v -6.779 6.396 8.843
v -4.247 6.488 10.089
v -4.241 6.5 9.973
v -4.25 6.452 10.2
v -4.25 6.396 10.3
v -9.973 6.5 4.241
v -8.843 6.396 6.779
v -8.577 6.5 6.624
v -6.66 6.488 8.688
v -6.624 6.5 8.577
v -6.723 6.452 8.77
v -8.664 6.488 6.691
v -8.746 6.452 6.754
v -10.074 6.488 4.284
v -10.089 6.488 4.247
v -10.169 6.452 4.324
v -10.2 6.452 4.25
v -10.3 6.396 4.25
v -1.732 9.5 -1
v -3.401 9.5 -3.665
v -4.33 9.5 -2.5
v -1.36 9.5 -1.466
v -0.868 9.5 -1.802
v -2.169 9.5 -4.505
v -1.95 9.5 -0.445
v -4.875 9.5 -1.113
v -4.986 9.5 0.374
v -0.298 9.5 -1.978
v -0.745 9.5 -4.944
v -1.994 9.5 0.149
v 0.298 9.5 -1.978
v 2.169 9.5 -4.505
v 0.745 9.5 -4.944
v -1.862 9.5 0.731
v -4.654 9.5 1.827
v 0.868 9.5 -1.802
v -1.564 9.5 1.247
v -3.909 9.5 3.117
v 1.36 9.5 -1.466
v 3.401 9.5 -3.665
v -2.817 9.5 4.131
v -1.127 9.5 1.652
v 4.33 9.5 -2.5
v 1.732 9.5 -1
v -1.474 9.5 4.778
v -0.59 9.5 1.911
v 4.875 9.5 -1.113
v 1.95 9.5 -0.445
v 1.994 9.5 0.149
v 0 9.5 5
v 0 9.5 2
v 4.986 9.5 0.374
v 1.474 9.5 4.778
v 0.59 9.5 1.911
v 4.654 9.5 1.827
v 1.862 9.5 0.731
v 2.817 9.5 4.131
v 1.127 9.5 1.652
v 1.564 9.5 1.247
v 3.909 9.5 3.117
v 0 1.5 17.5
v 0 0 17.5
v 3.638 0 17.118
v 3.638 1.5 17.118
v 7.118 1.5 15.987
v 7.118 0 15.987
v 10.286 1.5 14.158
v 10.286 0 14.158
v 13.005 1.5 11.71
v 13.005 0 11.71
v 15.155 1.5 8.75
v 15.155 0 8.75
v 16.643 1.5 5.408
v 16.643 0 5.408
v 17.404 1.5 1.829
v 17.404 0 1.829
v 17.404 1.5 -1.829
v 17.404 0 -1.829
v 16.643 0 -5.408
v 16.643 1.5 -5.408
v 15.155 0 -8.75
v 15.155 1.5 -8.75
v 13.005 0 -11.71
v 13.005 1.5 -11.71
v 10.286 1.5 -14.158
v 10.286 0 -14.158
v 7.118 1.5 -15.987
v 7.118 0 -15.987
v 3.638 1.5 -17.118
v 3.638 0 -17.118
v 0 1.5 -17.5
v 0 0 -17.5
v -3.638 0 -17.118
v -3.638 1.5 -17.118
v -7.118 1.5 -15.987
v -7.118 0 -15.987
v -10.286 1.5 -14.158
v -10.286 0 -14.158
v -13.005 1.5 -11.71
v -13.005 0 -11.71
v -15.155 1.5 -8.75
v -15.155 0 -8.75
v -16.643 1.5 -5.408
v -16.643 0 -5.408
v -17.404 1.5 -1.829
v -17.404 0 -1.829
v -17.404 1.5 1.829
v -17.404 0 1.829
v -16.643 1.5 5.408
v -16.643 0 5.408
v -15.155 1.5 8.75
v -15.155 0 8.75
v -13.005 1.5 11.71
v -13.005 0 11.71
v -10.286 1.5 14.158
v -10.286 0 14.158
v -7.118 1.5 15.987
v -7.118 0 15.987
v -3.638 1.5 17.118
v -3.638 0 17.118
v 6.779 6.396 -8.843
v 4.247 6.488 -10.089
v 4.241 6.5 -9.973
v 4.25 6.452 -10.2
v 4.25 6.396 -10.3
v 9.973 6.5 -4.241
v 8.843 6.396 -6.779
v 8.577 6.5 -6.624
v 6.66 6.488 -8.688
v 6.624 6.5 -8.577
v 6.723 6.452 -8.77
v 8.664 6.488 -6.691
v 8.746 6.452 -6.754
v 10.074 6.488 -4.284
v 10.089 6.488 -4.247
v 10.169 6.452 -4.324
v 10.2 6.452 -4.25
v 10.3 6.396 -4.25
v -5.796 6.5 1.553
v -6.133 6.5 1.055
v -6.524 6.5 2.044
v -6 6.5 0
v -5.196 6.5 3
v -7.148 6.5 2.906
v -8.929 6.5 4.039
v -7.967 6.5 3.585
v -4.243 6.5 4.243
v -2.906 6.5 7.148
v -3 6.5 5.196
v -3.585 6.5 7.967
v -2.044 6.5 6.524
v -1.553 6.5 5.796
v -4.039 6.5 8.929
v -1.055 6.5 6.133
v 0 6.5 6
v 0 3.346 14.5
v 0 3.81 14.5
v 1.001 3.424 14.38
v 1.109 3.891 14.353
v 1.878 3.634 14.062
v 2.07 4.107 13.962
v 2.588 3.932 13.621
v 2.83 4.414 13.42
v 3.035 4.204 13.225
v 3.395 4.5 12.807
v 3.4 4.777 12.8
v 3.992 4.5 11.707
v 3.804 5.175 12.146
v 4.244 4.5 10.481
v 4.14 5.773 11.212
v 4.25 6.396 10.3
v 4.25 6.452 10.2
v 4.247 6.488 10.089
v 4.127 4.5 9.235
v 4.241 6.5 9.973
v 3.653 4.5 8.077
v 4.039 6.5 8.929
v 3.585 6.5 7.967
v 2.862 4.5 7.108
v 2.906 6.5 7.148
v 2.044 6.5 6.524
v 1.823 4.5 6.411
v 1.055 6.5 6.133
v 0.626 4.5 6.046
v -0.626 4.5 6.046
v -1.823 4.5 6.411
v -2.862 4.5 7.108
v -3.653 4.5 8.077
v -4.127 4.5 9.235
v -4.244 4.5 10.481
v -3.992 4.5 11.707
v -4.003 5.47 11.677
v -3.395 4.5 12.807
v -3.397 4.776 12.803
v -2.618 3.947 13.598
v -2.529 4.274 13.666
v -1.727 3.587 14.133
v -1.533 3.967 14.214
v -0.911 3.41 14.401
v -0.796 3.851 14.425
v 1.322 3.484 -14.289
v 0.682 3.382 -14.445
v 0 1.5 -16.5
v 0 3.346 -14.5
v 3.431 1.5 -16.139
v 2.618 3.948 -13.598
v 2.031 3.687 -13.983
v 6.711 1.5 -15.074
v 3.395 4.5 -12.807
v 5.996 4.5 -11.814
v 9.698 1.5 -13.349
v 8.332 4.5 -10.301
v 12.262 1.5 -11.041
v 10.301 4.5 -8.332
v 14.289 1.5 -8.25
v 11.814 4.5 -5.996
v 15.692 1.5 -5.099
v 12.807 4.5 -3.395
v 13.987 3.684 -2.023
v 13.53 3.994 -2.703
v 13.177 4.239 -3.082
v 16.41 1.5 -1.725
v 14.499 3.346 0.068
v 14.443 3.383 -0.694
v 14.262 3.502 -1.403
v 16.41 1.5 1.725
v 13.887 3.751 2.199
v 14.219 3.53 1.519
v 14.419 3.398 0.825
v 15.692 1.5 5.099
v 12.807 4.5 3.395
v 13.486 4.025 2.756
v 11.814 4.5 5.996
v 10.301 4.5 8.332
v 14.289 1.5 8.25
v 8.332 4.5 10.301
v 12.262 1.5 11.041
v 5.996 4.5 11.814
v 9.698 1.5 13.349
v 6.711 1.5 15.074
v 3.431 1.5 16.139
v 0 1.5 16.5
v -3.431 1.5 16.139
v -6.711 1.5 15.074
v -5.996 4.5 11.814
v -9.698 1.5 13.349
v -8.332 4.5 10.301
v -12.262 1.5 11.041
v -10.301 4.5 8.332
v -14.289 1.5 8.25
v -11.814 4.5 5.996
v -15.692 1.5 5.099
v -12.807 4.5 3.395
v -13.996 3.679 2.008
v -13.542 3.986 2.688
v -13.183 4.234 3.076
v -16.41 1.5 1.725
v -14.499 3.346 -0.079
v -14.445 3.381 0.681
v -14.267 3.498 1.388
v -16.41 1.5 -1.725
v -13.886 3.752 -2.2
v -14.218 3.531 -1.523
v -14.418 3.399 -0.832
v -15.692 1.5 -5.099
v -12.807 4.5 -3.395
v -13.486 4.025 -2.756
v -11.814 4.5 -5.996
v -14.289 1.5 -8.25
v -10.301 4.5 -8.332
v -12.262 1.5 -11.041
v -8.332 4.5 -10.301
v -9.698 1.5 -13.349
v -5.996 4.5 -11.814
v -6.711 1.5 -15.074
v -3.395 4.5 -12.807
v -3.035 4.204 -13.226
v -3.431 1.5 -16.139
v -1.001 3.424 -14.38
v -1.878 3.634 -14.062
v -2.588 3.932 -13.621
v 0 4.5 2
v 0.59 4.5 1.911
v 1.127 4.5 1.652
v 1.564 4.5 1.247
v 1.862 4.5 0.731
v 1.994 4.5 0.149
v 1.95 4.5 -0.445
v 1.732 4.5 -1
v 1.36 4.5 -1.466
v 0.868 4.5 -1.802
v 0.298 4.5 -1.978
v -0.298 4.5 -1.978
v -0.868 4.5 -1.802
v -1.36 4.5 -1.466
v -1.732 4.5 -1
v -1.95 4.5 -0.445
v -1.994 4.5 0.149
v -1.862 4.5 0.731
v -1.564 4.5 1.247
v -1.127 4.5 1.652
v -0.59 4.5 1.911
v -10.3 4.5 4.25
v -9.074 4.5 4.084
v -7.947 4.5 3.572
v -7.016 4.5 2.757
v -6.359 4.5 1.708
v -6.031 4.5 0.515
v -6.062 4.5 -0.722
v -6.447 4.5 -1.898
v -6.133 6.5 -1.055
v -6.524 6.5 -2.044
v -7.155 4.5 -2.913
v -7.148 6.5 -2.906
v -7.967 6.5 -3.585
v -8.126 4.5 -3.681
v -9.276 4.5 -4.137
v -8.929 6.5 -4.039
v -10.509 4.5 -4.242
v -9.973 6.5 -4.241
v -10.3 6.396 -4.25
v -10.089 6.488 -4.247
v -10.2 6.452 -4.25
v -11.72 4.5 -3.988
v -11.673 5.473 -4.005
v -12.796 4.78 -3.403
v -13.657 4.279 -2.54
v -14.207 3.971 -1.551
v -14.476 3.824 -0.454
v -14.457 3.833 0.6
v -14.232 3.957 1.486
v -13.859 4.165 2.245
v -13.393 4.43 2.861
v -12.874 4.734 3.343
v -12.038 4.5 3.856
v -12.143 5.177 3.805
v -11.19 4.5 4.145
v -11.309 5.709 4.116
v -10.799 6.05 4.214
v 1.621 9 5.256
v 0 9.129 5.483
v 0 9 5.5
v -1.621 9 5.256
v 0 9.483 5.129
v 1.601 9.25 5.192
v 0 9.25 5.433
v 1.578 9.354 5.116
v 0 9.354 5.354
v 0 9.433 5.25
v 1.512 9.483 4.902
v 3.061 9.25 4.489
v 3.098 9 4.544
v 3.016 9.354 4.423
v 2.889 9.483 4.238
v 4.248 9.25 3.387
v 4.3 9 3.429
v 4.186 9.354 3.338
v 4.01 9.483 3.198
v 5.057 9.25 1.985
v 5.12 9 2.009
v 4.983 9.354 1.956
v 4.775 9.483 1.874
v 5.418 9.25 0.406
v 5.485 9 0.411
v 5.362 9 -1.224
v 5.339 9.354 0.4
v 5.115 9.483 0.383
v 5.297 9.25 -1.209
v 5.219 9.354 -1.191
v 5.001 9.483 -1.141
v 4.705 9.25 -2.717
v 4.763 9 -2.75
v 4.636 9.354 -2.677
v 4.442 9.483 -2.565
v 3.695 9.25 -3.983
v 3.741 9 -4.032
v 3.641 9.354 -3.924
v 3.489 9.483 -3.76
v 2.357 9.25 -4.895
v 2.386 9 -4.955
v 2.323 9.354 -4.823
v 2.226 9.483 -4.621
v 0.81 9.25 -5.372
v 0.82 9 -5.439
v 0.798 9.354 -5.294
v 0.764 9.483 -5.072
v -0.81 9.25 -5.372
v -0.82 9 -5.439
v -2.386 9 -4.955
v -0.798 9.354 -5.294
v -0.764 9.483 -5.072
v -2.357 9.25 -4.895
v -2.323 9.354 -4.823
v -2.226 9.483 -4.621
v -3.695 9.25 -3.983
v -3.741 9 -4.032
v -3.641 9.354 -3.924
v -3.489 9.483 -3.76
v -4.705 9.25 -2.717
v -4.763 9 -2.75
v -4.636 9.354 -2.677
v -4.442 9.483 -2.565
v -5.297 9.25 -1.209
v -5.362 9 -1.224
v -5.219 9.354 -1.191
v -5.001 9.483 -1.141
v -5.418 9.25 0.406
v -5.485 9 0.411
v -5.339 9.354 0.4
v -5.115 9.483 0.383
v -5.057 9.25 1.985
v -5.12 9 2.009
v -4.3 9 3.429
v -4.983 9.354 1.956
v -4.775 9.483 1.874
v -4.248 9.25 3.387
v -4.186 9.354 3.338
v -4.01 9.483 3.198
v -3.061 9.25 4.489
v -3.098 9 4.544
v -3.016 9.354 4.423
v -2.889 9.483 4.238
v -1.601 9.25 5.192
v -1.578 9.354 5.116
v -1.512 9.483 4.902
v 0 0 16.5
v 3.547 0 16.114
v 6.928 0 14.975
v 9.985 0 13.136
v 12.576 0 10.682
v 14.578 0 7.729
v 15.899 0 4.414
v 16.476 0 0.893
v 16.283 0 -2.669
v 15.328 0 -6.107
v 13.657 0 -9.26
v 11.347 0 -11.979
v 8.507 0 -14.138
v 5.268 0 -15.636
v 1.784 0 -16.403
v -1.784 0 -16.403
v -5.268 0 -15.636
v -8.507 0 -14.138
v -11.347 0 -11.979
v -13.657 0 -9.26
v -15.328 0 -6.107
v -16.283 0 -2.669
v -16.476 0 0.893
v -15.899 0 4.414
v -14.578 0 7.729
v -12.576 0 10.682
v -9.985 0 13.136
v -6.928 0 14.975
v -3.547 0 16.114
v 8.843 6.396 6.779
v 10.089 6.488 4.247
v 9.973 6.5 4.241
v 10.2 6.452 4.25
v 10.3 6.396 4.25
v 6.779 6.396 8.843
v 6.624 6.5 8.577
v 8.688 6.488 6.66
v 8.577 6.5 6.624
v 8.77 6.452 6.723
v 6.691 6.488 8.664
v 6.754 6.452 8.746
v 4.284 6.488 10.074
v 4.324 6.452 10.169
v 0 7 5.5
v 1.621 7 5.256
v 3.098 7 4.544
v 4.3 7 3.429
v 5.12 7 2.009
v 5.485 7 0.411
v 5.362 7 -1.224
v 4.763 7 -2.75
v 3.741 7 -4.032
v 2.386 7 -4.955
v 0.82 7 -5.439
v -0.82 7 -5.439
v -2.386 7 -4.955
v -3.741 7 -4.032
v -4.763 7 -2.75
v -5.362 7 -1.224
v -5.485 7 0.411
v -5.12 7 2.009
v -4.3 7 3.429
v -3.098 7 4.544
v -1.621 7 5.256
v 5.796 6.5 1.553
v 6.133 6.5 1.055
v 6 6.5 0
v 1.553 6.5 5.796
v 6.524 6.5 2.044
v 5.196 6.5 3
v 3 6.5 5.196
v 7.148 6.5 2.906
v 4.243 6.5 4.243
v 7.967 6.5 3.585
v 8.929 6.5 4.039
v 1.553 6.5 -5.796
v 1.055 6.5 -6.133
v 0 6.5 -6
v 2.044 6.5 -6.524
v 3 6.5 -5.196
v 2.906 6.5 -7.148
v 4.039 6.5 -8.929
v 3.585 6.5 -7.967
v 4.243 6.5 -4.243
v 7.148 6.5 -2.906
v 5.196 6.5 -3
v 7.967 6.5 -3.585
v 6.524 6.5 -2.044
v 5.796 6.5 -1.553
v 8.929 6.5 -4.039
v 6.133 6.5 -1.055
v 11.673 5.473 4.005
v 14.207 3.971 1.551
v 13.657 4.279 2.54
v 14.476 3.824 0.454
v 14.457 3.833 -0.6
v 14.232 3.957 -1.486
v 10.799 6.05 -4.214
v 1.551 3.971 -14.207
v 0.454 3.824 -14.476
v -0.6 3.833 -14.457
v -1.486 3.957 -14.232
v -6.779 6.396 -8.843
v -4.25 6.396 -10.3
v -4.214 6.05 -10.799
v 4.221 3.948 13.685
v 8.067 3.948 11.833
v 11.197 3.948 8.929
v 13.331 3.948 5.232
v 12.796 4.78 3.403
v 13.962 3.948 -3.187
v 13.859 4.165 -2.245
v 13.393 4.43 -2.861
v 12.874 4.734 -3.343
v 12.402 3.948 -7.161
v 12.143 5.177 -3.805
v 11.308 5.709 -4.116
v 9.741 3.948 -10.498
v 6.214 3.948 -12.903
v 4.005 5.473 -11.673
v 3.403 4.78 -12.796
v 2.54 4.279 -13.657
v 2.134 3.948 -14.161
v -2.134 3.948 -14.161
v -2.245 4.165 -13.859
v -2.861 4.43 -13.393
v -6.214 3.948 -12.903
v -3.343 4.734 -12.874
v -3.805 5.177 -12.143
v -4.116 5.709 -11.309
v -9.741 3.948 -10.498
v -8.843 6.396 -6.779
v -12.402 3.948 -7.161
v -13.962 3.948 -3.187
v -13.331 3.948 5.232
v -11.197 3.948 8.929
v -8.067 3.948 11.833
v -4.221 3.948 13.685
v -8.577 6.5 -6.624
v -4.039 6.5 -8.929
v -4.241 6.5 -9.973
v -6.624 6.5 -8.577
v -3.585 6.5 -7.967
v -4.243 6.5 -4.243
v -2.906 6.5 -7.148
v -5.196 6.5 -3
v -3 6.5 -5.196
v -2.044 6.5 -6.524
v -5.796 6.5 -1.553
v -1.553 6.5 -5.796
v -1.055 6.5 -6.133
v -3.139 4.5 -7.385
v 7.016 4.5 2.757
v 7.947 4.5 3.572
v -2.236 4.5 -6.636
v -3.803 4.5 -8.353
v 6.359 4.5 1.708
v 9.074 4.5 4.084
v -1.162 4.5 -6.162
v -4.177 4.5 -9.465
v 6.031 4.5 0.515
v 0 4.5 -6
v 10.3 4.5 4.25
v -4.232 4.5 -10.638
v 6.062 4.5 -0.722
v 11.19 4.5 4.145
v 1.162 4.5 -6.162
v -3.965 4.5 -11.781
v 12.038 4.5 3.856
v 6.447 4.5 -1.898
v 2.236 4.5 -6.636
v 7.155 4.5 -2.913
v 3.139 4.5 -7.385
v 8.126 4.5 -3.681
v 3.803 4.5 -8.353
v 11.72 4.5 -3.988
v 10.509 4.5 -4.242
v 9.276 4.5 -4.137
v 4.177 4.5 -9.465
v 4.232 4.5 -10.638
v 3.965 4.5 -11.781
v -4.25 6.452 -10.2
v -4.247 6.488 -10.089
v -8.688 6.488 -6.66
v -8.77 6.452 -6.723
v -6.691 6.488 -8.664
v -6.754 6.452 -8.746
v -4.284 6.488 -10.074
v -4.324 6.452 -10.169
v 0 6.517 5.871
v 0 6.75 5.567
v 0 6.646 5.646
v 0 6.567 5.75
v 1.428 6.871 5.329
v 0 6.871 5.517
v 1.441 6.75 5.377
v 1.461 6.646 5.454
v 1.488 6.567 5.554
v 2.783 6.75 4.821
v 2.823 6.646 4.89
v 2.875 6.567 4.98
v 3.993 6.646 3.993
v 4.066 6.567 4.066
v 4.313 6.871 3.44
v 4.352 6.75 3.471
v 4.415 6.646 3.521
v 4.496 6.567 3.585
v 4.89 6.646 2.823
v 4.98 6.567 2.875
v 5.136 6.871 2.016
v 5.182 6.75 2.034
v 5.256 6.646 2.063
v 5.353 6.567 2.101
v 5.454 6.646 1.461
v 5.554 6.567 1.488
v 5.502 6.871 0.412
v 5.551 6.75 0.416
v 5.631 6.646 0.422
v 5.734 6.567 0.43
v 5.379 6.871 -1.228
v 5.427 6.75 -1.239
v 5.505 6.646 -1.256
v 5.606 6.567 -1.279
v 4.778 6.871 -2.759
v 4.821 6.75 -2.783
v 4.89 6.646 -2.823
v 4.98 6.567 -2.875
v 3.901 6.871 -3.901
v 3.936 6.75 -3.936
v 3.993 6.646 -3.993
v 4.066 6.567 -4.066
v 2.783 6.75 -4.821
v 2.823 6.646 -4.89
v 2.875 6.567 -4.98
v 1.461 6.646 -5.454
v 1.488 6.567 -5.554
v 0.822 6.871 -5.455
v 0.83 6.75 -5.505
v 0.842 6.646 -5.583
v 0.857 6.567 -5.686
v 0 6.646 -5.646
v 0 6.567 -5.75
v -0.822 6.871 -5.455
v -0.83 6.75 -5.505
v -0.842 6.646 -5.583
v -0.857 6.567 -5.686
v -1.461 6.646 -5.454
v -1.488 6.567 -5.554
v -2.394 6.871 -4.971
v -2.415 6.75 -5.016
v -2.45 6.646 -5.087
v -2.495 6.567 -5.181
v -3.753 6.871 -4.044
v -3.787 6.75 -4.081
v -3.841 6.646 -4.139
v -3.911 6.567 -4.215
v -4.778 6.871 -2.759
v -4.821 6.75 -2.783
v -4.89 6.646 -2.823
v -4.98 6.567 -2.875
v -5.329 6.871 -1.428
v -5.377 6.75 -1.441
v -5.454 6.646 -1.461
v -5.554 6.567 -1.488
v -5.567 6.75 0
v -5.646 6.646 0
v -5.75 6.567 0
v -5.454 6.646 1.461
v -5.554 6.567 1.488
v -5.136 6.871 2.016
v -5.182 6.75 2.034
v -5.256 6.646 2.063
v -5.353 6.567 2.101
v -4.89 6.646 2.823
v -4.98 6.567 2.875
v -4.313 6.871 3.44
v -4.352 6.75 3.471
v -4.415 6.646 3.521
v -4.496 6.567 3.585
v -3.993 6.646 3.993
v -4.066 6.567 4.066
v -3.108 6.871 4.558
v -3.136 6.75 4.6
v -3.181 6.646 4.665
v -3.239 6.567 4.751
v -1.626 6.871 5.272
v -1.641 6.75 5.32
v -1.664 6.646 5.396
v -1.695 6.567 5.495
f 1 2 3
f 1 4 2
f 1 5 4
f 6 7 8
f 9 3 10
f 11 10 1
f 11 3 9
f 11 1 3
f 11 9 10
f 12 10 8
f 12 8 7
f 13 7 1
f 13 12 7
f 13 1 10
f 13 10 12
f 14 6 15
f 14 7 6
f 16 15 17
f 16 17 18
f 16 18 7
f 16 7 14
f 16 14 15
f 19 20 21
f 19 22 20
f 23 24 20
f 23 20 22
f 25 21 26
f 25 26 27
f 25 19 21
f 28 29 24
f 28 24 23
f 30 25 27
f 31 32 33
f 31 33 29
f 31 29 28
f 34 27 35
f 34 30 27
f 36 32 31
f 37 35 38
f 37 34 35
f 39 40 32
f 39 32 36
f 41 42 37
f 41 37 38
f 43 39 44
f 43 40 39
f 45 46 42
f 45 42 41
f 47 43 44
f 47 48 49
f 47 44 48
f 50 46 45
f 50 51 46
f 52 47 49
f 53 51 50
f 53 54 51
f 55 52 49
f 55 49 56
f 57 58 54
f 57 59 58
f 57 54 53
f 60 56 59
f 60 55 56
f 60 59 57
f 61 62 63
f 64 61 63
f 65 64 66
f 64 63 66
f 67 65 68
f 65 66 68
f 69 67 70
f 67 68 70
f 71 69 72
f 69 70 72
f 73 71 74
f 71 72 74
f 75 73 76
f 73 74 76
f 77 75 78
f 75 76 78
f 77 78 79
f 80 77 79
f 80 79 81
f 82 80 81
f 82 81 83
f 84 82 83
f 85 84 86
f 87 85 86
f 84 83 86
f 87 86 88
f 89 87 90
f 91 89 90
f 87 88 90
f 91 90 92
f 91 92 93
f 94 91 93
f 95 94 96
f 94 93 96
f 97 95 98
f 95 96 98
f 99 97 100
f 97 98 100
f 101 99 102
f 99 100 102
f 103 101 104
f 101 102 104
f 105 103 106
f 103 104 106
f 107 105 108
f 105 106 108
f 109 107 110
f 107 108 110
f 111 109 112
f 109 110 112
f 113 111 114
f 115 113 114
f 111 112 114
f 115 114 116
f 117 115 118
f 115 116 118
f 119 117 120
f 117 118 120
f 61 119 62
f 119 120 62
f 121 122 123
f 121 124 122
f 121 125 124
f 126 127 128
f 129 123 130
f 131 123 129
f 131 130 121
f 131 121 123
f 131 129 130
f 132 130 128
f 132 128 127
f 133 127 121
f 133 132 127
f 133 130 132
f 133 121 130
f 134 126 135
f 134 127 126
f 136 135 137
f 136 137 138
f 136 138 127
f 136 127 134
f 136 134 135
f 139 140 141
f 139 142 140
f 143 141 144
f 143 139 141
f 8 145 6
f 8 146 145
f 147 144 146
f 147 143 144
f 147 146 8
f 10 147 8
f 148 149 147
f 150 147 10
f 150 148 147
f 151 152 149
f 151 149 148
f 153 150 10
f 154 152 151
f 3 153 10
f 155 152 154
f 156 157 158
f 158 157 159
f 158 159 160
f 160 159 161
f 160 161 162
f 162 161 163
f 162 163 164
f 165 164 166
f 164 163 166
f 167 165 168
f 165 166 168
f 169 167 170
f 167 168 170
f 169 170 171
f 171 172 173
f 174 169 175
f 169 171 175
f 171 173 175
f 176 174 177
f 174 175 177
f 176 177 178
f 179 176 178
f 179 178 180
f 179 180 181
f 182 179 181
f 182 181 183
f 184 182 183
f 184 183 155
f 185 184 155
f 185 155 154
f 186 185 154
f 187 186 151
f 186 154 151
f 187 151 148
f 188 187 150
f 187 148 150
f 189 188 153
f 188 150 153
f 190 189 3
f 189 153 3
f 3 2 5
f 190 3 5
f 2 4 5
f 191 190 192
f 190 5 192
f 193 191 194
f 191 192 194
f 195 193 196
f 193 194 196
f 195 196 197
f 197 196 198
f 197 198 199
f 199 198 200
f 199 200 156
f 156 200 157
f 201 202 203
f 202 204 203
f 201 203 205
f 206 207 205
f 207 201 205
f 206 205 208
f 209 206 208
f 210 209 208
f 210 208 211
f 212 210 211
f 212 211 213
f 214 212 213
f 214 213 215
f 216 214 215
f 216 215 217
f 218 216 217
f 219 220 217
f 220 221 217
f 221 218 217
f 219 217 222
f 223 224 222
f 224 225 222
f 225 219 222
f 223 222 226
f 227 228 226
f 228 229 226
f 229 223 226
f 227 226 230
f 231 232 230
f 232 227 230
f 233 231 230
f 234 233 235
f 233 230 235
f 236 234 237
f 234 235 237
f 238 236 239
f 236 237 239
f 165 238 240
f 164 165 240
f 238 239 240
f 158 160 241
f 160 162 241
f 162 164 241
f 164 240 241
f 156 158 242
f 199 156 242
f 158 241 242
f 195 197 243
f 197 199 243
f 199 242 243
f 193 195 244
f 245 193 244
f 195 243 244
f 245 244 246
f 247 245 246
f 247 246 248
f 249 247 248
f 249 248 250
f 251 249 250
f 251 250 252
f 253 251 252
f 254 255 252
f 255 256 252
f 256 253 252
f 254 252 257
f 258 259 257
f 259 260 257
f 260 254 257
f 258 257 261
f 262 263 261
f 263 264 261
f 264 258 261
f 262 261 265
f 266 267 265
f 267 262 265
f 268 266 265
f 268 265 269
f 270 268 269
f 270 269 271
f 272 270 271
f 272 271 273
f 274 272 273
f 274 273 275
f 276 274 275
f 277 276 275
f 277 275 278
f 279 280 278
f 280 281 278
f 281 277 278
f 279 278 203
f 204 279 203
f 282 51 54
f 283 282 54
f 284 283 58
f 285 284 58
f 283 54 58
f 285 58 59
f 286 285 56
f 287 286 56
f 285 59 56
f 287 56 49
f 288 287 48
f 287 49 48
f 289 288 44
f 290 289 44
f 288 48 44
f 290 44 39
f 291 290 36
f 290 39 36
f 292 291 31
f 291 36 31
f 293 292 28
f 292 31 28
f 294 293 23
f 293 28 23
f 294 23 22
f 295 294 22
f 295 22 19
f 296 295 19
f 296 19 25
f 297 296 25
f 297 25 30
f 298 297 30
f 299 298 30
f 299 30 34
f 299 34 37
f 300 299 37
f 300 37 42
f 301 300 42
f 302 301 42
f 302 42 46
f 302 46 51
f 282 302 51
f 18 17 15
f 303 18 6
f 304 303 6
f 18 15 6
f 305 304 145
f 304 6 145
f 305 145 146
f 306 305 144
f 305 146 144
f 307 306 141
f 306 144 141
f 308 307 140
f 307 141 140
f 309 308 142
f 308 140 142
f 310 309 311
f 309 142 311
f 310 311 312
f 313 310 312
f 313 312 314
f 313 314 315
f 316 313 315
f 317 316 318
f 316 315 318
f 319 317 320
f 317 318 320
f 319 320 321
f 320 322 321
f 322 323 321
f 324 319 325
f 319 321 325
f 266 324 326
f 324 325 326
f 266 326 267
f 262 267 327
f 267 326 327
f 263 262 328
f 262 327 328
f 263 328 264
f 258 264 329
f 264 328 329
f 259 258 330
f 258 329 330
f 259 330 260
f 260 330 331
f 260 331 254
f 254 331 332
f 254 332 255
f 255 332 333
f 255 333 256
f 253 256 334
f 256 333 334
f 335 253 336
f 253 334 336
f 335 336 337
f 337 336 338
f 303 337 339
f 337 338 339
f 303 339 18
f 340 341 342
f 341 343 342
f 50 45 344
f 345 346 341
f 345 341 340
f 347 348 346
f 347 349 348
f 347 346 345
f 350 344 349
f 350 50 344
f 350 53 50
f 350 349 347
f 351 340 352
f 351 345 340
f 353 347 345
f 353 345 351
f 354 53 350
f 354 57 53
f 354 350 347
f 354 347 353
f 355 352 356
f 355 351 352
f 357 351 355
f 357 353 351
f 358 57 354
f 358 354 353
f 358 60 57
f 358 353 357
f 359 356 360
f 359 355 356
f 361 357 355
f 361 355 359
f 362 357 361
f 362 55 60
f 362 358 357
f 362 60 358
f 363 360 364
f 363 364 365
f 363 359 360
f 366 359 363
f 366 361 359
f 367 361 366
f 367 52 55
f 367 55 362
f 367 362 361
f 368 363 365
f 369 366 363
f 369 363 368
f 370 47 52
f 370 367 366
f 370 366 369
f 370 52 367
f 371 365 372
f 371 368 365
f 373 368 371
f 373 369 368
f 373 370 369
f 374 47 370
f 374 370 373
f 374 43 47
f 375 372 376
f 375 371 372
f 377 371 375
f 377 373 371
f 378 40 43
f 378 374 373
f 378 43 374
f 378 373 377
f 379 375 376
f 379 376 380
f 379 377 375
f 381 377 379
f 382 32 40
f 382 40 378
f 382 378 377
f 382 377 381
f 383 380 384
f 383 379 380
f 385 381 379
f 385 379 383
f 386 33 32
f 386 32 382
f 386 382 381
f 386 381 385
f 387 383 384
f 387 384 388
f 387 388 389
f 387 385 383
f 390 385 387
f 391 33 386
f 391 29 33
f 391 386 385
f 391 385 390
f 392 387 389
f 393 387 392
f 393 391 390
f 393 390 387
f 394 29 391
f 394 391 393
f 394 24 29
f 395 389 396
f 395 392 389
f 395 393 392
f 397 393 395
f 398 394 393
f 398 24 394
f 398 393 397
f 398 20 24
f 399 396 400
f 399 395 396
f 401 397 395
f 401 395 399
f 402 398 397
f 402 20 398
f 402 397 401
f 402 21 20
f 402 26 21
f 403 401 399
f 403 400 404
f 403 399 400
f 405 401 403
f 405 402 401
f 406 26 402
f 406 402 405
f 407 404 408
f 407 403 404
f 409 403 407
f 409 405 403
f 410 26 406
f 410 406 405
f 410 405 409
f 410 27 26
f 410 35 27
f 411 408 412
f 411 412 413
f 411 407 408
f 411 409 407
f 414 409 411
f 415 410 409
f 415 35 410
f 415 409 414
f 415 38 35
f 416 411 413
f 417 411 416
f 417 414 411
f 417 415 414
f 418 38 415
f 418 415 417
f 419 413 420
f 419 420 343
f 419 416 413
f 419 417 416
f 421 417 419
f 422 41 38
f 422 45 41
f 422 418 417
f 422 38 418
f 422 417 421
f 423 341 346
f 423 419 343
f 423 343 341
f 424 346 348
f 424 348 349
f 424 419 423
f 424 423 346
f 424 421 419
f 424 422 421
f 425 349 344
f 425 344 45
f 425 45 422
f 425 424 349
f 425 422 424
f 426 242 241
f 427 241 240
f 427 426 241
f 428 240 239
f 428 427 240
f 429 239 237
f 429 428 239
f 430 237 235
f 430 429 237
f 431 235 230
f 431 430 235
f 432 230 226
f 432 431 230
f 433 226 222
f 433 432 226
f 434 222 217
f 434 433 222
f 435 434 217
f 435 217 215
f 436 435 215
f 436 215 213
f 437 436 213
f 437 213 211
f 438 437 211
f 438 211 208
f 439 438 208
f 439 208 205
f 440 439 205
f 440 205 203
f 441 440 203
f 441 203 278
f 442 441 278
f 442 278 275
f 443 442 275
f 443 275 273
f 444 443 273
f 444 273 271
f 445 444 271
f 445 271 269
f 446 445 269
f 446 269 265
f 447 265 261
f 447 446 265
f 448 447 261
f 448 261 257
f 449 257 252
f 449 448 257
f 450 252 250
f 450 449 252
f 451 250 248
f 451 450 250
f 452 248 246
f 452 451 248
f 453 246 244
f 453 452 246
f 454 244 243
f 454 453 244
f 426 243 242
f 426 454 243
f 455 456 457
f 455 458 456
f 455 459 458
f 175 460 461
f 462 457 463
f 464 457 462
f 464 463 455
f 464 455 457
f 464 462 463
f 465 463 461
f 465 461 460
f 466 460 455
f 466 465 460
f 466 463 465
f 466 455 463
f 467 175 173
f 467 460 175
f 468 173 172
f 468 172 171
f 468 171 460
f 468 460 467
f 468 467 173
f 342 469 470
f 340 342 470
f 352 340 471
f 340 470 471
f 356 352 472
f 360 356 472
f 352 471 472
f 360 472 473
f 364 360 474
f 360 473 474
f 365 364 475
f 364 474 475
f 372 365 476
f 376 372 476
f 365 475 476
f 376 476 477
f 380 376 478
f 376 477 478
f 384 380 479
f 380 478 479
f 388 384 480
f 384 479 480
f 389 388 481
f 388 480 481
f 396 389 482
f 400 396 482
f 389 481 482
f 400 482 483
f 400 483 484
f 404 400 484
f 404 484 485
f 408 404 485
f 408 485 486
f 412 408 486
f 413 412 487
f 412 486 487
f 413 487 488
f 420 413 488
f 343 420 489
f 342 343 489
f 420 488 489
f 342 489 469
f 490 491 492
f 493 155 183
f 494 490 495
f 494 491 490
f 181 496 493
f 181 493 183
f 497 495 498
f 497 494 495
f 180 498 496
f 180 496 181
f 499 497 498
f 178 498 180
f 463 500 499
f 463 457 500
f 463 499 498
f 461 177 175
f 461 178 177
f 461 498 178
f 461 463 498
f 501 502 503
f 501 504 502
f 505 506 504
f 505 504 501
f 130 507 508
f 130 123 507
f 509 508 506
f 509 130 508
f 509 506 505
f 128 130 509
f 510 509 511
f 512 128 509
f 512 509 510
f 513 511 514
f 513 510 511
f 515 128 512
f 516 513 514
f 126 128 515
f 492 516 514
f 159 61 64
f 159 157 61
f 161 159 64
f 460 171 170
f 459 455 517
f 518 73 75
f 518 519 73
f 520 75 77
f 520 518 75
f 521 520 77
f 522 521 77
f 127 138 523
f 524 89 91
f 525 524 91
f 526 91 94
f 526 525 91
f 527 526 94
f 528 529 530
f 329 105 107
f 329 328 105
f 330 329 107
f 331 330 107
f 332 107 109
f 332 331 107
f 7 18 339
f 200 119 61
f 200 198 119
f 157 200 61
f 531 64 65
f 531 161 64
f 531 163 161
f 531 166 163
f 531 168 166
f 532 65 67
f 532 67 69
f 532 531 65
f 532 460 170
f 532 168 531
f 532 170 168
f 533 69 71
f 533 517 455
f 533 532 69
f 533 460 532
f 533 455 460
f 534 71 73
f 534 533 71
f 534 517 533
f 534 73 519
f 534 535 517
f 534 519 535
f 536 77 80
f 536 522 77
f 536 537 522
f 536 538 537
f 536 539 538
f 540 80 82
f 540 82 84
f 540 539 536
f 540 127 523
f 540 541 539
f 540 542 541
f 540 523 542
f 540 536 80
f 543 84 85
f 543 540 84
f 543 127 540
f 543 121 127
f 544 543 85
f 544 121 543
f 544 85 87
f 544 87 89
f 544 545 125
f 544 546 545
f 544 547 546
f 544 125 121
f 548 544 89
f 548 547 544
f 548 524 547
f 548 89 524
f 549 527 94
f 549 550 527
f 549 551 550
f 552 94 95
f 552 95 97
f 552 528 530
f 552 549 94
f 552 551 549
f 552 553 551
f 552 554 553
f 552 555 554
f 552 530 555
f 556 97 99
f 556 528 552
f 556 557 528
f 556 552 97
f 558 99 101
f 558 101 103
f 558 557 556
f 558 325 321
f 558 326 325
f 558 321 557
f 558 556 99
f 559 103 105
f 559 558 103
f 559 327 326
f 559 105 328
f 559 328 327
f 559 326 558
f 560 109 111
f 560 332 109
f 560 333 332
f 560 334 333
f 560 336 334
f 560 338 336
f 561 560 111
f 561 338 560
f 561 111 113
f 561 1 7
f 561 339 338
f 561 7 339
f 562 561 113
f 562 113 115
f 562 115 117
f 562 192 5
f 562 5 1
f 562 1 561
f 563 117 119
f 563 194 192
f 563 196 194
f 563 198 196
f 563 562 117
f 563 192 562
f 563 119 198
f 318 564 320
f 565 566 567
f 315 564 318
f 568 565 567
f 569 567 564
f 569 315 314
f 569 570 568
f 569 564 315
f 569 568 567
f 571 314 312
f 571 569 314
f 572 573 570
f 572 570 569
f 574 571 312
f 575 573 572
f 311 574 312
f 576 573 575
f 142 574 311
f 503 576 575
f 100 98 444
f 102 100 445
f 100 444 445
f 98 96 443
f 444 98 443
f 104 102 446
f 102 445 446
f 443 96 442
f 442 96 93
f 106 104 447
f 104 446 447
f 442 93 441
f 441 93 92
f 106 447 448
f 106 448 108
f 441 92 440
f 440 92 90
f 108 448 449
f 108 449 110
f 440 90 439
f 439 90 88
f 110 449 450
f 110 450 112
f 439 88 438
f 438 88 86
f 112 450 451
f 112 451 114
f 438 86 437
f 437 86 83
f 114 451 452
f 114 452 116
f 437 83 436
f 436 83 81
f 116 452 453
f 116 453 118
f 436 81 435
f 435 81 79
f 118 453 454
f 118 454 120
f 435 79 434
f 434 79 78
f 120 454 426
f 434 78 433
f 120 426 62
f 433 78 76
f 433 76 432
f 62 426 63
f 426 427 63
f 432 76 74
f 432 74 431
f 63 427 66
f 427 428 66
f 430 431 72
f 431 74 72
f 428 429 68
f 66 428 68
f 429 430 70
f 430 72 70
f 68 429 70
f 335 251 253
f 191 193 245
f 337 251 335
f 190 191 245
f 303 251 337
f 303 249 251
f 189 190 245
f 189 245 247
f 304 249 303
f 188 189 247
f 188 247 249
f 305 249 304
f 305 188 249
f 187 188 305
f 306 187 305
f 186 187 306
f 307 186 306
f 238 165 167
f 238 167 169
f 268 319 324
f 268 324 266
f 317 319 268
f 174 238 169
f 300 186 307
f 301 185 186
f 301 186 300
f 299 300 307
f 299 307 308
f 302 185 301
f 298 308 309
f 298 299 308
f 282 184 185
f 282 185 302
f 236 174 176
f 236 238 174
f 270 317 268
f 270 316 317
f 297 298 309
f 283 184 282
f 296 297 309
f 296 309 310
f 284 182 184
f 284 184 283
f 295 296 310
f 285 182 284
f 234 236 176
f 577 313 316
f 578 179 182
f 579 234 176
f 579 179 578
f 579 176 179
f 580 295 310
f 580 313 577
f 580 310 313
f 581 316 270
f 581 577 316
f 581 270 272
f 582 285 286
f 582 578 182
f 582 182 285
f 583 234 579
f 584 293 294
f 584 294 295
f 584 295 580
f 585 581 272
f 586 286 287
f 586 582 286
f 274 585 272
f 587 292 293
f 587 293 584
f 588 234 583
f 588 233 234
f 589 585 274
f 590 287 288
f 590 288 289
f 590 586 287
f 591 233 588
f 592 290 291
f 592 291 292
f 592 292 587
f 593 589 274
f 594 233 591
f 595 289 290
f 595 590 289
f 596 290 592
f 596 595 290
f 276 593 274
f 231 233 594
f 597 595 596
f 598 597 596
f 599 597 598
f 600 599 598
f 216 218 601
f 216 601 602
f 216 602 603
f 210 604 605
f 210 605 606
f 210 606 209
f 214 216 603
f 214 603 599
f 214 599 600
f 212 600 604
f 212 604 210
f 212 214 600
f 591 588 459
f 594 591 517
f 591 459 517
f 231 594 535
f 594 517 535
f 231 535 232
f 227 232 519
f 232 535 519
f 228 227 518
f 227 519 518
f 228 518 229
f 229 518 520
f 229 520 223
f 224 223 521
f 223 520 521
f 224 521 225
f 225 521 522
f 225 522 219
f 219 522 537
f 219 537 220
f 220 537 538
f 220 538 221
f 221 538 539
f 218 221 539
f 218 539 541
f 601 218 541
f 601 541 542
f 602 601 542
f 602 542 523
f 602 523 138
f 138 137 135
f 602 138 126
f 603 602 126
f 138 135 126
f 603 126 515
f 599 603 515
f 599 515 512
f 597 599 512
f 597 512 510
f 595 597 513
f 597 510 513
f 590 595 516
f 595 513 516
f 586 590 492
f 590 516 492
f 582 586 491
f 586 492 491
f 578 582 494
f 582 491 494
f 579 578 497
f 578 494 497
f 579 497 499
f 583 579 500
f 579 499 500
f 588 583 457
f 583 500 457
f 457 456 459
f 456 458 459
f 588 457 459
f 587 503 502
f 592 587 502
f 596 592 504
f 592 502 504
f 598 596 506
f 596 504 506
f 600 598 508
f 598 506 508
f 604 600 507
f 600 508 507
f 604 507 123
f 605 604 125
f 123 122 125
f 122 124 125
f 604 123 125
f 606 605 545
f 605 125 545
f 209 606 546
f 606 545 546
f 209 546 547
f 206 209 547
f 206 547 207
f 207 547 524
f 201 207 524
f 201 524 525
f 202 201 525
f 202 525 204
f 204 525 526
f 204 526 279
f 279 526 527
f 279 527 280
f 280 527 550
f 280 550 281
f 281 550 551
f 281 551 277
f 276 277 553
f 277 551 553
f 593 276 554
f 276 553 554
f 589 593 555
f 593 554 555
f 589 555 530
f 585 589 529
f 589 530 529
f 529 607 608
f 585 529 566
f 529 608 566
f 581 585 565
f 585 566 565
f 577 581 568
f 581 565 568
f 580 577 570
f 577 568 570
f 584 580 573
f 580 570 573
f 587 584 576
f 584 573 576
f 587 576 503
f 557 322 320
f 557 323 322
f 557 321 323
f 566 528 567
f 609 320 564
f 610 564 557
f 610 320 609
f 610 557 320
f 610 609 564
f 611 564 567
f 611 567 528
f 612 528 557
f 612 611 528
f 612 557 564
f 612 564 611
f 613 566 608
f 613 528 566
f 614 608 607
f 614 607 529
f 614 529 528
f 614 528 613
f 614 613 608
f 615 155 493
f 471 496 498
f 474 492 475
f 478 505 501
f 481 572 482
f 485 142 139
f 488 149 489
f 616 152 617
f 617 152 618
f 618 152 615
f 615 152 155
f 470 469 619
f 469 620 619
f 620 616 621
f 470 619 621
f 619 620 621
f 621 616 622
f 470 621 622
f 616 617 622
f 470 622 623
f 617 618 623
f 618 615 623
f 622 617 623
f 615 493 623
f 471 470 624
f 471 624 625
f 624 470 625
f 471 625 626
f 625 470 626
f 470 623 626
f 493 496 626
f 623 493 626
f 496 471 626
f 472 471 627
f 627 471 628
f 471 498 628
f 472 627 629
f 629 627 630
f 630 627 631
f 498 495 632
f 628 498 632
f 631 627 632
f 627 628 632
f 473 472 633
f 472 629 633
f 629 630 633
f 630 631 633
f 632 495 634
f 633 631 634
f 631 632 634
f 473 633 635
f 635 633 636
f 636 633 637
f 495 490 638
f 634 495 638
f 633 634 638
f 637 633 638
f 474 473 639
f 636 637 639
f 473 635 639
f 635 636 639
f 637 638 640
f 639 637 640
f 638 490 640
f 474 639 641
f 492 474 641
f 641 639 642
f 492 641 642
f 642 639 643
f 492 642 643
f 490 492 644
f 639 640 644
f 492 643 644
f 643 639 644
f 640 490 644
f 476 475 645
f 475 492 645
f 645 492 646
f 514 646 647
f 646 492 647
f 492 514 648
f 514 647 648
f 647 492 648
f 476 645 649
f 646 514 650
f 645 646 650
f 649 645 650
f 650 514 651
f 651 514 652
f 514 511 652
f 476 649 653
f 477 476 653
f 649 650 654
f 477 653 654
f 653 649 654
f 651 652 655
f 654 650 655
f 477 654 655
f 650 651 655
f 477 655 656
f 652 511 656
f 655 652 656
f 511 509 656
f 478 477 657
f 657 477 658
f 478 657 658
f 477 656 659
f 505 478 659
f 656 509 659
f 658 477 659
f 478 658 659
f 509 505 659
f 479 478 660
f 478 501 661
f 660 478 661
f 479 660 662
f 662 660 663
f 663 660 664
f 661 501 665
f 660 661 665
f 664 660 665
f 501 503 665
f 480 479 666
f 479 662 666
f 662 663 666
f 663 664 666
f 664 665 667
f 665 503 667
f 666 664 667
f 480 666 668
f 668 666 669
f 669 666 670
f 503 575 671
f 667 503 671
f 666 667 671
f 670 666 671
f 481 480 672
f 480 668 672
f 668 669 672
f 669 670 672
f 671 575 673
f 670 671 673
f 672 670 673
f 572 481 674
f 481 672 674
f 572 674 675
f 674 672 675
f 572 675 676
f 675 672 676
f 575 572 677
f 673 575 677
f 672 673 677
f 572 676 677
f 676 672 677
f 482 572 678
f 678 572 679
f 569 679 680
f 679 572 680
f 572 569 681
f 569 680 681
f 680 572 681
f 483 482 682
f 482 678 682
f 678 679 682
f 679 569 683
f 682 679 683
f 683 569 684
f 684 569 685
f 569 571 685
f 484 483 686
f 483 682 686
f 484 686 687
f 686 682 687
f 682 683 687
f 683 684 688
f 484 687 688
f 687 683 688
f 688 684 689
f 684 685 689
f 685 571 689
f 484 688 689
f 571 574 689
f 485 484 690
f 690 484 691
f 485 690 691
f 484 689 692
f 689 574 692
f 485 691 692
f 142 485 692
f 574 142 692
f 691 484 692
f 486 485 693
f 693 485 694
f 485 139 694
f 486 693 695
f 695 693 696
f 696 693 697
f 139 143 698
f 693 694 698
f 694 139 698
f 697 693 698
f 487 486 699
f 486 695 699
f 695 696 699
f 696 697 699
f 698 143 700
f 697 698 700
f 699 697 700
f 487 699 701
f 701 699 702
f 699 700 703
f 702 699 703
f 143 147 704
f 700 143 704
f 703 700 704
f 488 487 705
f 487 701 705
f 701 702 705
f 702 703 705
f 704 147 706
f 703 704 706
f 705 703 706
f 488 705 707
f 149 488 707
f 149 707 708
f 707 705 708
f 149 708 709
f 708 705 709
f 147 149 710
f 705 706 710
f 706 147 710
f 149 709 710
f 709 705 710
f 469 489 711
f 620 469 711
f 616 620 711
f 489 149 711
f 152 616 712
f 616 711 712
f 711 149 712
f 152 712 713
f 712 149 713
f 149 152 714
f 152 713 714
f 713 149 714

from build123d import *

# Parameters (mm, degrees)
SKETCH1_R           = 17.5
SKETCH1_R_2         = 16.5
BOSS_EXTRUDE1_DEPTH = 1.5
SKETCH2_R           = 17.5
BOSS_EXTRUDE2_DEPTH = 5
BOSS_EXTRUDE2_TAPER = 52.4
SKETCH4_R           = 16.5
CUT_EXTRUDE1_DEPTH  = 3
CUT_EXTRUDE1_DRAFT  = -47.3
SKETCH5_R           = 5.5
BOSS_EXTRUDE3_DEPTH = 3
FILLET1_R           = 0.5
SKETCH6_R           = 2
CUT_EXTRUDE2_DEPTH  = 27.509432416
FILLET2_R           = 0.5
FILLET3_R           = 0.5
SKETCH7_R           = 4.25
CUT_EXTRUDE3_DEPTH  = 26.588083301


with BuildPart() as part:
    # Sketch1 → Boss-Extrude1 (new body)
    with BuildSketch(Plane(origin=(0, 0, 0), x_dir=(1, 0, 0), z_dir=(0, 1, 0))):
        with Locations(Location((0, 0, 0), (0, 0, 270))):
            Circle(SKETCH1_R)
        with Locations(Location((0, 0, 0), (0, 0, 270))):
            Circle(SKETCH1_R_2, mode=Mode.SUBTRACT)
    extrude(amount=BOSS_EXTRUDE1_DEPTH)

    # Sketch2 → Boss-Extrude2 (add)
    with BuildSketch(Plane(origin=(0, 1.5, 0), x_dir=(1, 0, 0), z_dir=(0, 1, 0))):
        with Locations(Location((0, 0, 0), (0, 0, 270))):
            Circle(SKETCH2_R)
    extrude(amount=BOSS_EXTRUDE2_DEPTH, taper=BOSS_EXTRUDE2_TAPER)


with BuildPart() as cut_extrude1_tool:
    # Sketch4 → Cut-Extrude1 (with draft: the straight prism first)
    with BuildSketch(Plane.XZ.offset(-1.5)):
        with Locations(Location((0, 0, 0), (0, 0, 270))):
            Circle(SKETCH4_R)
    extrude(amount=-CUT_EXTRUDE1_DEPTH)
    # Cut-Extrude1: the draft: its side faces are tilted about the plane it starts from
    cut_extrude1_sides = [cut_extrude1_tool.faces().sort_by_distance(p)[0] for p in [
        (0, 3, 16.5),
    ]]
    draft(cut_extrude1_sides, Plane.XZ.offset(-1.5), CUT_EXTRUDE1_DRAFT)


with BuildPart() as part_1:
    add(part.part)

    # Cut-Extrude1: cut by cut_extrude1_tool
    add(cut_extrude1_tool.part, mode=Mode.SUBTRACT)

    # Sketch5 → Boss-Extrude3 (add)
    with BuildSketch(Plane(origin=(0, 6.5, 0), x_dir=(1, 0, 0), z_dir=(0, 1, 0))):
        with Locations(Location((0, 0, 0), (0, 0, 270))):
            Circle(SKETCH5_R)
    extrude(amount=BOSS_EXTRUDE3_DEPTH)

    # Fillet1
    fillet1_edges = [part_1.edges().sort_by_distance(p)[0] for p in [
        (0, 9.5, -5.5),
    ]]
    fillet(fillet1_edges, radius=FILLET1_R)

    # Sketch6 → Cut-Extrude2 (cut, through all)
    with BuildSketch(Plane(origin=(0, 9.5, 0), x_dir=(1, 0, 0), z_dir=(0, 1, 0))):
        with Locations(Location((0, 0, 0), (0, 0, 270))):
            Circle(SKETCH6_R)
    extrude(amount=-CUT_EXTRUDE2_DEPTH, mode=Mode.SUBTRACT)

    # Fillet2
    fillet2_edges = [part_1.edges().sort_by_distance(p)[0] for p in [
        (0, 6.5, -5.5),
    ]]
    fillet(fillet2_edges, radius=FILLET2_R)

    # Fillet3
    fillet3_edges = [part_1.edges().sort_by_distance(p)[0] for p in [
        (0, 6.5, -11.007367671),
    ]]
    fillet(fillet3_edges, radius=FILLET3_R)

    # Sketch7 → Cut-Extrude3 (cut, through all)
    with BuildSketch(Plane(origin=(0, 6.5, 0), x_dir=(1, 0, 0), z_dir=(0, 1, 0))):
        with Locations(Location((0, 10.25, 0), (0, 0, 270))):
            Circle(SKETCH7_R)
        with Locations(Location((10.25, 0, 0), (0, 0, 270.673562962))):
            Circle(SKETCH7_R)
        with Locations(Location((0, -10.25, 0), (0, 0, 269.99999999))):
            Circle(SKETCH7_R)
        with Locations(Location((-10.25, 0, 0), (0, 0, 269.326436338))):
            Circle(SKETCH7_R)
    extrude(amount=-CUT_EXTRUDE3_DEPTH, mode=Mode.SUBTRACT)


solid = part_1.part
